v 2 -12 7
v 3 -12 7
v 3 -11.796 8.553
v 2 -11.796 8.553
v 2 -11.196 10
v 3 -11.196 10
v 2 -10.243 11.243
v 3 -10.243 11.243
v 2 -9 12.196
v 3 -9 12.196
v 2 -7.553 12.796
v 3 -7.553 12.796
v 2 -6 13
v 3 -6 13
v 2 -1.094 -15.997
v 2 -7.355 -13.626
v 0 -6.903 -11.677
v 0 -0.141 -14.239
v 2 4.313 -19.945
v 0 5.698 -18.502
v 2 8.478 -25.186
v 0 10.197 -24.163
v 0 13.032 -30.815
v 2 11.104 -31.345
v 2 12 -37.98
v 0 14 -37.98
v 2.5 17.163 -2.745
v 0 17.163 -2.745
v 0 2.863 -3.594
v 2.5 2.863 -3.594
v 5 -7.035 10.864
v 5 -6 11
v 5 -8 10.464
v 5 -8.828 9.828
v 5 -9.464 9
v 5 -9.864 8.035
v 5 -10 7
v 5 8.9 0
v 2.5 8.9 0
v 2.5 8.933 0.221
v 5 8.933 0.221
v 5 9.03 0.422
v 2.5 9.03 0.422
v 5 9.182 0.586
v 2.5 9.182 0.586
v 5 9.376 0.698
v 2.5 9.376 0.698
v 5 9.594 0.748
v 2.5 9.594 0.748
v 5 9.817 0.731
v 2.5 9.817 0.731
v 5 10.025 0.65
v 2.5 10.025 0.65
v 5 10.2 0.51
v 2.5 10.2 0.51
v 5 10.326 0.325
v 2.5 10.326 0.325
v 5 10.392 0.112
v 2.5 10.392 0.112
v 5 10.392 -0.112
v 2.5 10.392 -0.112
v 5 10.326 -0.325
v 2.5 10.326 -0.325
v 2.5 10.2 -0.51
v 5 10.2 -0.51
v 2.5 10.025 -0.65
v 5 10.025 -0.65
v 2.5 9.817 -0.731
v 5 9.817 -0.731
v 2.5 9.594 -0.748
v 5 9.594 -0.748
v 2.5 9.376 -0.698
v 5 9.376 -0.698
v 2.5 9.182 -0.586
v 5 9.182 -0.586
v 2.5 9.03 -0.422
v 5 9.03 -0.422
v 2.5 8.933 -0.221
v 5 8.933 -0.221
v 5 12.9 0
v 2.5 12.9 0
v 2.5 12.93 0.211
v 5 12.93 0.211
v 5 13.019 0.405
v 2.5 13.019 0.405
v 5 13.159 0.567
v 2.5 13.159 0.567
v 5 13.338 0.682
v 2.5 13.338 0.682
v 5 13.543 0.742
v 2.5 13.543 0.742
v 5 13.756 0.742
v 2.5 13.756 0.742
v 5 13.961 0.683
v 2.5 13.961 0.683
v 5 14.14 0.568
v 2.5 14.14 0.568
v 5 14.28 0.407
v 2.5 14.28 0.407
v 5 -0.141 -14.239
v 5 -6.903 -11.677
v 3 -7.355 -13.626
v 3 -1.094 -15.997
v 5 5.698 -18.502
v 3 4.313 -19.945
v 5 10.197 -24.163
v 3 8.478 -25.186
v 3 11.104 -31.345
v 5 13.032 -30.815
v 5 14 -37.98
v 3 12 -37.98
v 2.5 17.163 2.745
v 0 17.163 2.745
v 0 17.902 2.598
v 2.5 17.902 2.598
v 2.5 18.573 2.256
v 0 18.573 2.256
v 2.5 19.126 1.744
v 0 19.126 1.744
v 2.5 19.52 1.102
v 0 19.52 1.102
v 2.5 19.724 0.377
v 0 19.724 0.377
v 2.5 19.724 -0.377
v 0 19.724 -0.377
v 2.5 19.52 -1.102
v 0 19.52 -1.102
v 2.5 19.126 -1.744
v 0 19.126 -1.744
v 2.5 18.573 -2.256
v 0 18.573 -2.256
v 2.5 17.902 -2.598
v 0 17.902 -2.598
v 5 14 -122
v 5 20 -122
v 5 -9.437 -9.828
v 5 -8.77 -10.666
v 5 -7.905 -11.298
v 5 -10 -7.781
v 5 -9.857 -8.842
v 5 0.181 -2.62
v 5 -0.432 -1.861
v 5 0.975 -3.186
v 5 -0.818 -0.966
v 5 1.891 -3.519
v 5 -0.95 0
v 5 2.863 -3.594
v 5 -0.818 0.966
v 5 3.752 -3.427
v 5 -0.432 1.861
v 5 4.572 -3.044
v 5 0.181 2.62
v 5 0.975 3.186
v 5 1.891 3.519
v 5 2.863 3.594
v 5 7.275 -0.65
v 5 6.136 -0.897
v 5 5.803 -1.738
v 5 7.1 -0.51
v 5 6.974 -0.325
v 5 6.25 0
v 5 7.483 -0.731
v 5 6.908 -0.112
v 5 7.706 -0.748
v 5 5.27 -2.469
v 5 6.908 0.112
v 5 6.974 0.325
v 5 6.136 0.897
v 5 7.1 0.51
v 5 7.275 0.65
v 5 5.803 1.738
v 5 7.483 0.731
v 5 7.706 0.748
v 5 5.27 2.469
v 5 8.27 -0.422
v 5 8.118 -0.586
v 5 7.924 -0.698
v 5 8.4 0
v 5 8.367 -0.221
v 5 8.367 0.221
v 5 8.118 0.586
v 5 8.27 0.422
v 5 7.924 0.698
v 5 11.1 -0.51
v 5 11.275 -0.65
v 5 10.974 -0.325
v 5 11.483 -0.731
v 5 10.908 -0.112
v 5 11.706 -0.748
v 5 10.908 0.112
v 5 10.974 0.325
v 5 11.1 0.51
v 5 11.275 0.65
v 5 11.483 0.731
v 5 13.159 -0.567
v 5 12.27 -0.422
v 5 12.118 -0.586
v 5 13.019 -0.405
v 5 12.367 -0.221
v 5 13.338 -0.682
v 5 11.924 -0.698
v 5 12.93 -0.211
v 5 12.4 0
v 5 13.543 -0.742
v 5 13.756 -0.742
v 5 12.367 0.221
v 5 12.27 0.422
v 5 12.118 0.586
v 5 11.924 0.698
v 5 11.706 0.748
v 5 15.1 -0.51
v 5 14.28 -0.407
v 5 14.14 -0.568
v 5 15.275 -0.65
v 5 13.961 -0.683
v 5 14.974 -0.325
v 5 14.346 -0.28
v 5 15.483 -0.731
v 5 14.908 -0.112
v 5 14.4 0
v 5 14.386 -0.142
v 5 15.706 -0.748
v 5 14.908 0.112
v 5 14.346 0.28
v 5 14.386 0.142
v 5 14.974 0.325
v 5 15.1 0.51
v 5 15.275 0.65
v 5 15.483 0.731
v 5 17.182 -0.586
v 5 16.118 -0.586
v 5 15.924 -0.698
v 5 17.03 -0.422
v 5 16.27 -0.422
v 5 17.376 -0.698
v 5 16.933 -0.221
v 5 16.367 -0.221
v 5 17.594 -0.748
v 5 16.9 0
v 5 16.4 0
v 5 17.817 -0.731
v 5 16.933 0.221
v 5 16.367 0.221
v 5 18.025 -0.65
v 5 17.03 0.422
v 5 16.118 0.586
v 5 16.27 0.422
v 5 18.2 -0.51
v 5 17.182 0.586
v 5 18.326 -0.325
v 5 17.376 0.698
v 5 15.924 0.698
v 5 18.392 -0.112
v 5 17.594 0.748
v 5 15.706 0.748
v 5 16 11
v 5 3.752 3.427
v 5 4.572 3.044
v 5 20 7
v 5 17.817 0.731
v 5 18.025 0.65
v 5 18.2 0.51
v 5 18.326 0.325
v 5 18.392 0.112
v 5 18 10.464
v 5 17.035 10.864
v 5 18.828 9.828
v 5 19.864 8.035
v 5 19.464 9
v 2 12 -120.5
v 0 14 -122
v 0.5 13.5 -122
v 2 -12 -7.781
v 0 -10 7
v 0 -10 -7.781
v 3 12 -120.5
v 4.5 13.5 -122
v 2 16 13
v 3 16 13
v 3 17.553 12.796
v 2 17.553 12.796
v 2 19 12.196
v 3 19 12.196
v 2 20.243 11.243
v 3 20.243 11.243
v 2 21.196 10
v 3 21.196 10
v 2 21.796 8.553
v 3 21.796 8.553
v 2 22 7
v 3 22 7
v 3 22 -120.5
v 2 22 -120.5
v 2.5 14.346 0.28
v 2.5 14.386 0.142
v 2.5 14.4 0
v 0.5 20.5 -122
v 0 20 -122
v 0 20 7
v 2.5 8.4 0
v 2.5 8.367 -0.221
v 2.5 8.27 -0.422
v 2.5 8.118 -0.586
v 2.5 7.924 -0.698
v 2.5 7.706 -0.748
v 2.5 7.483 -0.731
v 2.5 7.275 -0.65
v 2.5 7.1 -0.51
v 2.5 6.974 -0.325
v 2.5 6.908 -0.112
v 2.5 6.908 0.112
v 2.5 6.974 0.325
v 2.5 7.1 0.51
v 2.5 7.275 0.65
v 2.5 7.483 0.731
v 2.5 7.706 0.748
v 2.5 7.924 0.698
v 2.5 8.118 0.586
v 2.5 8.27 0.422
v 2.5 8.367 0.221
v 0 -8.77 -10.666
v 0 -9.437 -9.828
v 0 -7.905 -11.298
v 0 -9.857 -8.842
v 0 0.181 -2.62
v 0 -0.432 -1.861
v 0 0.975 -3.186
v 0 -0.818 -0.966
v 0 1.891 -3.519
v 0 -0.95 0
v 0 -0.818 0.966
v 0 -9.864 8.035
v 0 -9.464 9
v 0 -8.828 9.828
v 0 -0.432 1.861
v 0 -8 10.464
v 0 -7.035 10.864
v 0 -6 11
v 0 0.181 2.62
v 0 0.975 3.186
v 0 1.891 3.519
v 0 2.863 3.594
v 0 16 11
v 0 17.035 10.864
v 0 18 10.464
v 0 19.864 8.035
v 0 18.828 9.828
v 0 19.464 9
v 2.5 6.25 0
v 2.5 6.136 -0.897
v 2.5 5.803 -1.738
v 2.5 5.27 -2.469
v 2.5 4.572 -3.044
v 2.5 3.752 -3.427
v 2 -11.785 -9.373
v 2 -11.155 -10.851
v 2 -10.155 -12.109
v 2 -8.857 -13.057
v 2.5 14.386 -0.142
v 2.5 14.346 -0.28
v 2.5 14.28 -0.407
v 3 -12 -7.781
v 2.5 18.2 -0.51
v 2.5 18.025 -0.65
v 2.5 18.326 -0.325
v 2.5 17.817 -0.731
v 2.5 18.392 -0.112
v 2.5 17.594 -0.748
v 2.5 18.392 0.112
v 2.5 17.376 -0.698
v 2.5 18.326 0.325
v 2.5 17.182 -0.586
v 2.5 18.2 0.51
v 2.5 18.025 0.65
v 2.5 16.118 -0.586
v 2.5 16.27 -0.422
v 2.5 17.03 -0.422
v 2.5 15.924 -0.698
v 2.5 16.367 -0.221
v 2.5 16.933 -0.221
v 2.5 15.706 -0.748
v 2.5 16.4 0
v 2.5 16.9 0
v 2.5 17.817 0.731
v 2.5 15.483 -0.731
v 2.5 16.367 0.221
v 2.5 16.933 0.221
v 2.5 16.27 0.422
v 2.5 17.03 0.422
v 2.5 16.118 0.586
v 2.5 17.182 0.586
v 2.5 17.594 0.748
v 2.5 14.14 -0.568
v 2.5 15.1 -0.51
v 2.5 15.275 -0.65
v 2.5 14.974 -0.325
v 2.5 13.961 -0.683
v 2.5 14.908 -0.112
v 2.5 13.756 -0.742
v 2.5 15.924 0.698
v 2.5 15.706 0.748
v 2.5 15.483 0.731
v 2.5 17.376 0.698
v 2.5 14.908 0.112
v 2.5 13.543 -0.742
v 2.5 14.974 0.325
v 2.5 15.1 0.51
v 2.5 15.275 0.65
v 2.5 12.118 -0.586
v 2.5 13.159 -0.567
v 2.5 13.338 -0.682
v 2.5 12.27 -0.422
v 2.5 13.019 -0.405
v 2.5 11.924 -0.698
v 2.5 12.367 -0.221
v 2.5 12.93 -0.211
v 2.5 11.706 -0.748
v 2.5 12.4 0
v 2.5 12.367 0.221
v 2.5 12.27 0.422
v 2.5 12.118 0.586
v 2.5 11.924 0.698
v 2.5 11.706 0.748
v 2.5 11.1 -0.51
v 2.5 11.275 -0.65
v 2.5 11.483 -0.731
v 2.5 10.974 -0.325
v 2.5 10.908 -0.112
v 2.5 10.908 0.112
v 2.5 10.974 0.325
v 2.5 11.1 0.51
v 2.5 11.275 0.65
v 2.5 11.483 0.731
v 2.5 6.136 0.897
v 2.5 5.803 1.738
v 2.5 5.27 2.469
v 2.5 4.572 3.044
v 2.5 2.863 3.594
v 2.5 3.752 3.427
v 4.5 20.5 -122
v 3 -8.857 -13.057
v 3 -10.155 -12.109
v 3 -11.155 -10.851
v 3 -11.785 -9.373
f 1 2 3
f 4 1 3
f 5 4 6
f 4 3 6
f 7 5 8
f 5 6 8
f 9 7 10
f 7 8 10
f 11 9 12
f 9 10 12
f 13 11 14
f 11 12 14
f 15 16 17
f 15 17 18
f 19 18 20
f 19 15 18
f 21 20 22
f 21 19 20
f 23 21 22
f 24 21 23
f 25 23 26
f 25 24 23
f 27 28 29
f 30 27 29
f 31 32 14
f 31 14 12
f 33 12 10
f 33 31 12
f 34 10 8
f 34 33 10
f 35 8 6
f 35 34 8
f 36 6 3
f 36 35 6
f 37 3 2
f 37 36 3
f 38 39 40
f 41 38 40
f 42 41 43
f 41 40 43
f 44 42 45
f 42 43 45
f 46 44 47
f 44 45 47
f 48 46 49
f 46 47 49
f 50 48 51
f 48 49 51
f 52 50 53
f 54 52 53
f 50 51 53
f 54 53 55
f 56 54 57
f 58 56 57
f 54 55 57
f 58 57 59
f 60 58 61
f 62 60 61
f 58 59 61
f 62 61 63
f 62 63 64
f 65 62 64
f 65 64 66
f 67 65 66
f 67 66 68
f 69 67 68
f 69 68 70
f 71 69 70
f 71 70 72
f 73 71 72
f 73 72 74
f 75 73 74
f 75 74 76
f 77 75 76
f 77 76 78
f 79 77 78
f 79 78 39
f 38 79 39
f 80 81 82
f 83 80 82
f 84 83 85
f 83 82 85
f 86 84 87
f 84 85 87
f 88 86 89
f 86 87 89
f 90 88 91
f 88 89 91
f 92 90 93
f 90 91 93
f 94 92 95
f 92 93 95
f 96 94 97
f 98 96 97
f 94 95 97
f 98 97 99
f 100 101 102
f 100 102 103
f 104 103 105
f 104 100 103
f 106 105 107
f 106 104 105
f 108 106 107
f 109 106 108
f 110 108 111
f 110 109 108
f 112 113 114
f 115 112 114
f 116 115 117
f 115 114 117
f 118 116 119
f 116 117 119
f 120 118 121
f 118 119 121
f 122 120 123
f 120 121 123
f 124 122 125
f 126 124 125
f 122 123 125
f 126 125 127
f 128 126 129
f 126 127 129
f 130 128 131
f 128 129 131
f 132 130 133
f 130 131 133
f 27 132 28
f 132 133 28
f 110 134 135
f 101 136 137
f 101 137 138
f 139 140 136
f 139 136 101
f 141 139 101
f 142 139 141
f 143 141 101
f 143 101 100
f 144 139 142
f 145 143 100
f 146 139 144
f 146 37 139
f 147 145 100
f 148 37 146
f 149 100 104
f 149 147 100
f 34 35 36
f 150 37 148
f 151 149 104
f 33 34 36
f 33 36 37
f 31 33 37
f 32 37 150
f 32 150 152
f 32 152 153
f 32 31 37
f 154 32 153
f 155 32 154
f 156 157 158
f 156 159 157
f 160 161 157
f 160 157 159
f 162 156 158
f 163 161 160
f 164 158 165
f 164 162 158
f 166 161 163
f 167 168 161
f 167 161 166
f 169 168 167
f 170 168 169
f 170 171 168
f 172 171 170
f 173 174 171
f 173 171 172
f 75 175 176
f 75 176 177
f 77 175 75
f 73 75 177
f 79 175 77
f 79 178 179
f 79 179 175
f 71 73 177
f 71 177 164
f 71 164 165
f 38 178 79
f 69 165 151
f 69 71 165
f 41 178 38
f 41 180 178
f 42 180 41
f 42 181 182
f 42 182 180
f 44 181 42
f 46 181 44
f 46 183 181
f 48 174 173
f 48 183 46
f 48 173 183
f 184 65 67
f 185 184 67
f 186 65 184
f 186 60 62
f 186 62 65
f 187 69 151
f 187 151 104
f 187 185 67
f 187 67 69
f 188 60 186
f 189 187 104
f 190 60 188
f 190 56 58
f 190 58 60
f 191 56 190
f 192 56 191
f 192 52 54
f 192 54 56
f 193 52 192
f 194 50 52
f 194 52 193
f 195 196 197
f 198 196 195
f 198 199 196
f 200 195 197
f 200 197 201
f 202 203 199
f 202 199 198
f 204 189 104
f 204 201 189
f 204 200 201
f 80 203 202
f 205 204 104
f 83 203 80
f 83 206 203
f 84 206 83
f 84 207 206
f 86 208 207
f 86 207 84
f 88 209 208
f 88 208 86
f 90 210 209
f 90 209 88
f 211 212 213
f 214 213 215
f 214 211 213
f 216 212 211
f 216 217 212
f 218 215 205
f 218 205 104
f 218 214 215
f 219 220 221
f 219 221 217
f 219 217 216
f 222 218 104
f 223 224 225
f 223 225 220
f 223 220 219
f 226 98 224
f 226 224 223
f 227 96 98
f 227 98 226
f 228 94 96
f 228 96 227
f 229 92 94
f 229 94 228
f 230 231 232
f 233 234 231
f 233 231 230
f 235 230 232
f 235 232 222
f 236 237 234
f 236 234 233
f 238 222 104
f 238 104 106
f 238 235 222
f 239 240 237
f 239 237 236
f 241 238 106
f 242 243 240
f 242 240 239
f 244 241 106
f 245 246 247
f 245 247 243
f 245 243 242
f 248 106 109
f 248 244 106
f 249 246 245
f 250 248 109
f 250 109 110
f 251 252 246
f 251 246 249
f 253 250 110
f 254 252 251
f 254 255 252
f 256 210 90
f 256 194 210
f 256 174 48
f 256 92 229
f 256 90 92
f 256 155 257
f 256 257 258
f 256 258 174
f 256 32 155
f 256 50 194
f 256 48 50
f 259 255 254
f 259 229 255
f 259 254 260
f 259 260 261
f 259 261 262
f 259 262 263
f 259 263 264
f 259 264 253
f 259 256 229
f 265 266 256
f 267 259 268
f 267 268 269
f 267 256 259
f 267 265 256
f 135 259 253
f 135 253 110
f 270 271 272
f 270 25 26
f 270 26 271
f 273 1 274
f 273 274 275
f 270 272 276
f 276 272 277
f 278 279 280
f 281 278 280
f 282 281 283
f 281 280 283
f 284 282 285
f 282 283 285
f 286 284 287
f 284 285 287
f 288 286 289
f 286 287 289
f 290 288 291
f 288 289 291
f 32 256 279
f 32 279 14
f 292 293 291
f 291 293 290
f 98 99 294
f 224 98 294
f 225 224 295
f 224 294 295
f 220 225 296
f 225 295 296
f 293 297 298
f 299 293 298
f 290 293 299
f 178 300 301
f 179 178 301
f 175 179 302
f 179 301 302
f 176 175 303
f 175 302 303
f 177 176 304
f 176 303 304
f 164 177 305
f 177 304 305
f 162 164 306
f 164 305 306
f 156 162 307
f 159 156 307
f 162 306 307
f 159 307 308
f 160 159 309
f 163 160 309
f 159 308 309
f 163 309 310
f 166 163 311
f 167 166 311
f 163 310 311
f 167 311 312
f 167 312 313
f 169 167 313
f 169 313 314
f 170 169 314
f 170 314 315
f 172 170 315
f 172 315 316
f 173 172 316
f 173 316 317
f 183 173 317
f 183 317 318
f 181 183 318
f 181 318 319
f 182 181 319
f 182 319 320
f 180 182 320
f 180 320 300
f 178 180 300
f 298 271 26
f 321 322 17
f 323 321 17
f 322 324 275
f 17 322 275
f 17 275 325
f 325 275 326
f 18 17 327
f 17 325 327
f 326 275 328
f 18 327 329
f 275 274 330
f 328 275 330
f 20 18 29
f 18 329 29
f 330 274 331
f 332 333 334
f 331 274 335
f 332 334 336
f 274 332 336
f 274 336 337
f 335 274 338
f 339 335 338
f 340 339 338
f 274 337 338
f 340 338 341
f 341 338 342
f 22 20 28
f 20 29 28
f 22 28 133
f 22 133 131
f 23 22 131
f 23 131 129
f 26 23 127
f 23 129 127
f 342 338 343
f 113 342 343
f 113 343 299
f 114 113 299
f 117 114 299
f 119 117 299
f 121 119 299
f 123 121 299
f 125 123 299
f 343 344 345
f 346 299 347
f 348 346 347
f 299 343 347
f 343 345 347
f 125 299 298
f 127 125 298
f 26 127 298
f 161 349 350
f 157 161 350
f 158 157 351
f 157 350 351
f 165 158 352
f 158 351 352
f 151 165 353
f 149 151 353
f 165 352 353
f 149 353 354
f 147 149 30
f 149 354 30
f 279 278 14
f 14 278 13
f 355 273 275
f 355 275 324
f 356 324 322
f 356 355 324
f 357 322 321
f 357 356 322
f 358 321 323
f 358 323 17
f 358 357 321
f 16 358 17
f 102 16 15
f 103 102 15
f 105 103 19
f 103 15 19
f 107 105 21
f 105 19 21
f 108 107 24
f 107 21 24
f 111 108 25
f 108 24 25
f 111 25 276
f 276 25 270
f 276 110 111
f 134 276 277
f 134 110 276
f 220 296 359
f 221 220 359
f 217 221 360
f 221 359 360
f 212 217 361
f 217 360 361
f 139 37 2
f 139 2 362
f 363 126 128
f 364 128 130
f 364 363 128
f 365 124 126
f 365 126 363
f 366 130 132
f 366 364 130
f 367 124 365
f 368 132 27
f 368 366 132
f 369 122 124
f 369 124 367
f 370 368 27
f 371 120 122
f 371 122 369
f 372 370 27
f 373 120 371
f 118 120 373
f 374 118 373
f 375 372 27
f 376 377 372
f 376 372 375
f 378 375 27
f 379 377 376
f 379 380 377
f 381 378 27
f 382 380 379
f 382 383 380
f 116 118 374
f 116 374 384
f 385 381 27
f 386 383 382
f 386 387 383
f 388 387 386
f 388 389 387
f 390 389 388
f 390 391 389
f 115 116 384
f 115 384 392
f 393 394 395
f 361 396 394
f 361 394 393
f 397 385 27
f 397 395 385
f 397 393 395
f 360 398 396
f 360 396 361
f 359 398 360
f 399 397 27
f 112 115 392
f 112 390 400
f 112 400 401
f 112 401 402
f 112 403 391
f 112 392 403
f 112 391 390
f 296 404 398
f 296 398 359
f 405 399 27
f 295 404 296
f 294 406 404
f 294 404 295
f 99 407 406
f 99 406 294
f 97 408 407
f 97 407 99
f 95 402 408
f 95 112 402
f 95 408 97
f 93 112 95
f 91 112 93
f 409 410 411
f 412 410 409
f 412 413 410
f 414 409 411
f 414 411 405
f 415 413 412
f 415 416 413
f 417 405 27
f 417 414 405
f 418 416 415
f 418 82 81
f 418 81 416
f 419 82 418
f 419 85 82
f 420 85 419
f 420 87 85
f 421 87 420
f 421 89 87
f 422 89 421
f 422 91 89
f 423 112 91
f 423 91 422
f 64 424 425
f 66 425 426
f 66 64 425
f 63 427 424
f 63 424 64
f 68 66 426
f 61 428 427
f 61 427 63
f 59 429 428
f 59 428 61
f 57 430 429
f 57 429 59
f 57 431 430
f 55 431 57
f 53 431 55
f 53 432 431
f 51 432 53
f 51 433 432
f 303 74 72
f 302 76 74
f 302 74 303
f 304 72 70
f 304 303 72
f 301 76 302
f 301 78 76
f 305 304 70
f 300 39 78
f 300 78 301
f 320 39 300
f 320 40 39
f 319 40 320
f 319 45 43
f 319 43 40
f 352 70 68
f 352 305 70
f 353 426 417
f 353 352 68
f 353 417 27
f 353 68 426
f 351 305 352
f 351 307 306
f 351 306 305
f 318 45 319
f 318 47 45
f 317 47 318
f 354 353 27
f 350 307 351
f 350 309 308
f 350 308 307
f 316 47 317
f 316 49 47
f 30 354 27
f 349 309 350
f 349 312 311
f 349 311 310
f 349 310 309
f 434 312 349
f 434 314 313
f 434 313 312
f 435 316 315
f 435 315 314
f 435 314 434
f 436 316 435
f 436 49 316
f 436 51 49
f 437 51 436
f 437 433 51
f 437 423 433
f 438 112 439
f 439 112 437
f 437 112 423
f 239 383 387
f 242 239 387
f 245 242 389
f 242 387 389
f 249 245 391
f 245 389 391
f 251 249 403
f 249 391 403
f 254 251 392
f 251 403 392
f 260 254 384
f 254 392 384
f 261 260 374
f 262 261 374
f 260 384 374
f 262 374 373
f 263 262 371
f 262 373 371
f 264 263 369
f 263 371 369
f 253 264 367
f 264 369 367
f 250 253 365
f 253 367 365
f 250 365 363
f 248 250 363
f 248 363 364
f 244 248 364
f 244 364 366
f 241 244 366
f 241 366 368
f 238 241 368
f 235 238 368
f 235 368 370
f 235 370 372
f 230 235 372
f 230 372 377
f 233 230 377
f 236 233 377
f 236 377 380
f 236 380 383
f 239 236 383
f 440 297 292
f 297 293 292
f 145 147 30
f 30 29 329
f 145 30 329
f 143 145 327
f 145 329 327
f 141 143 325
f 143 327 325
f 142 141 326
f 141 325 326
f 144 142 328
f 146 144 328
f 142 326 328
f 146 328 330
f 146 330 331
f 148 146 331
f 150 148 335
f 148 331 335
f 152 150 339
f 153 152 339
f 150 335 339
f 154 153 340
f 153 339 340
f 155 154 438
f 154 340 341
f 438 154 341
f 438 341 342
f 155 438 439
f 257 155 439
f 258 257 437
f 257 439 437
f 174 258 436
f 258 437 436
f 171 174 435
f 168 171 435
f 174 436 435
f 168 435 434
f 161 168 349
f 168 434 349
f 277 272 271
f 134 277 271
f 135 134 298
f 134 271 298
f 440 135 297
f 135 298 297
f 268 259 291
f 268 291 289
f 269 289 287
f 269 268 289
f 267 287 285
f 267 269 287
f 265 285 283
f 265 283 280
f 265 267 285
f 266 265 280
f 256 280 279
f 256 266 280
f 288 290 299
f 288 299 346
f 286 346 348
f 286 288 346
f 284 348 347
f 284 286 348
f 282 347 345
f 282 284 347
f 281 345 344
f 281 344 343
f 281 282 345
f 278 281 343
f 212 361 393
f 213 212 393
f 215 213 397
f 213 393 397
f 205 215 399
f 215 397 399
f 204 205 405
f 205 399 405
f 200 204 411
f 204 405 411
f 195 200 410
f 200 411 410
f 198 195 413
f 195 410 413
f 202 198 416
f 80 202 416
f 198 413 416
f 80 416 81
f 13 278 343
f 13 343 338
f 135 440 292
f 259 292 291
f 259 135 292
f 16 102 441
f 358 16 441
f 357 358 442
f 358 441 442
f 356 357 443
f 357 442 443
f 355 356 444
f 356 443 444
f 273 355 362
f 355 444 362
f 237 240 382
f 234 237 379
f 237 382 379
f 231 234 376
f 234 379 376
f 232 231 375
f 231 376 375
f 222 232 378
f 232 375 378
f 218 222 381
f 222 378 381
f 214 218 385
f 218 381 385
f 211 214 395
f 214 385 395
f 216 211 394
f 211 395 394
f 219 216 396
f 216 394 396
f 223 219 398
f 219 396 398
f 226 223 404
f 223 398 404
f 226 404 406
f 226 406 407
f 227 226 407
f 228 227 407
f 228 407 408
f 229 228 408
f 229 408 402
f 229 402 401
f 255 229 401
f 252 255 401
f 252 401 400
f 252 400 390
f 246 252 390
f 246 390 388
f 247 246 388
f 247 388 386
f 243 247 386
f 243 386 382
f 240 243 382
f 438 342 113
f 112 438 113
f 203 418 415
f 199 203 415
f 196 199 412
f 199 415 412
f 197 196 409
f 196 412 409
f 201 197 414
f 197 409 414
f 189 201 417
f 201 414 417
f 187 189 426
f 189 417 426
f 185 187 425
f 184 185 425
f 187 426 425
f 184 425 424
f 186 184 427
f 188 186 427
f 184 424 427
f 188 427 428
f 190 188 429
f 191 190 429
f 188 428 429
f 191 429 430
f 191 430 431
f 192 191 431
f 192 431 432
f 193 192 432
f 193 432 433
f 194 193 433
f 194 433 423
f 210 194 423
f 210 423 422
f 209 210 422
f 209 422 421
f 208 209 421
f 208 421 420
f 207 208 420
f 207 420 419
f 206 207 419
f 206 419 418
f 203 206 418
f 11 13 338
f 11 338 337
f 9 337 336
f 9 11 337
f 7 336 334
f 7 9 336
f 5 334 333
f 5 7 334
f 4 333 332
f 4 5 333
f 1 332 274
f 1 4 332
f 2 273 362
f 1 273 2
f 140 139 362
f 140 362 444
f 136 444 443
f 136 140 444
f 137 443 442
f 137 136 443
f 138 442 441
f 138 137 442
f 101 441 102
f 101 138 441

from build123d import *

# Parameters (mm, degrees)
F0_W        = 24
F0_H        = 26
F1_DEPTH    = 5
F2_T1_DEPTH = 5
F3_SIZE     = 1.5
F4_R        = 6
F5_SIZE     = 2
F6_R        = 0.75
F7_DEPTH    = 5
F8_DEPTH    = 2.5


# Not quite as in the source:
# - a fillet or chamfer that OpenCascade refuses, or shapes differently, is made with other operations: its cross-section is extruded or revolved along the edge and cut away or added


with BuildPart() as f1:
    # F0 (on Right) → F1 (new body)
    with BuildSketch(Plane.YZ):
        Rectangle(F0_W, F0_H)
        Polygon((22, 13), (12, 13), (12, -13), (12, -122), (22, -122), align=None)
    extrude(amount=F1_DEPTH)

    # F2: fillet of radius 25 on 1 edges, made by hand

    # F2_s2 → F2_t1 (join)
    with BuildSketch(Plane.YZ):
        with BuildLine():
            ThreePointArc((-12, -13), (5.0277563773, -20.6594839179), (12, -37.9799919936))
            Line((12, -37.9799919936), (12, -13))
            Line((12, -13), (-12, -13))
        make_face()
    extrude(amount=F2_T1_DEPTH)

    # F3
    f3_edges = [f1.edges().sort_by_distance(p)[0] for p in [
        (2.5, 12, -122),
        (2.5, 22, -122),
    ]]
    chamfer(f3_edges, length=F3_SIZE)

    # F4
    f4_edges = [f1.edges().sort_by_distance(p)[0] for p in [
        (2.5, -12, -13),
        (2.5, -12, 13),
        (2.5, 22, 13),
    ]]
    fillet(f4_edges, radius=F4_R)

    # F5
    f5_edges = [f1.edges().sort_by_distance(p)[0] for p in [
        (5, 22, -56.75),
        (0, 22, -56.75),
        (0, 6.572034, -22.425717),
        (0, -10.697288, -11.51368),
        (0, 12, -79.239996),
        (0, -12, -0.390327),
        (0, -10.242641, 11.242641),
        (0, 5, 13),
        (0, 20.242641, 11.242641),
        (5, 6.572034, -22.425717),
        (5, -10.697288, -11.51368),
        (5, 12, -79.239996),
        (5, -12, -0.390327),
        (5, -10.242641, 11.242641),
        (5, 5, 13),
        (5, 20.242641, 11.242641),
    ]]
    chamfer(f5_edges, length=F5_SIZE)

    # F6 (on face) → F7 (cut)
    with BuildSketch(Plane(origin=(0, 0, 0), x_dir=(0, -1, 0), z_dir=(-1, 0, 0))):
        with BuildLine():
            ThreePointArc((-2.8632404181, 3.5936789679), (-5.2698917444, 2.469041767), (-6.25, 0))
            ThreePointArc((-6.25, 0), (-5.2698917444, -2.469041767), (-2.8632404181, -3.5936789679))
            ThreePointArc((-2.8632404181, -3.5936789679), (-0.180958233, -2.6198917444), (0.95, 0))
            ThreePointArc((0.95, 0), (-0.180958233, 2.6198917444), (-2.8632404181, 3.5936789679))
        make_face()
        with BuildLine():
            ThreePointArc((-5.25, 0), (-2.65, 2.6), (-0.05, 0))
            ThreePointArc((-0.05, 0), (-2.65, -2.6), (-5.25, 0))
        make_face(mode=Mode.SUBTRACT)
        with BuildLine():
            ThreePointArc((-5.25, 0), (-2.65, -2.6), (-0.05, 0))
            ThreePointArc((-0.05, 0), (-2.65, 2.6), (-5.25, 0))
        make_face()
        with Locations((-17.65, 0)):
            Circle(F6_R)
        with BuildLine():
            Line((-16.4, 0), (-14.9, 0))
            ThreePointArc((-14.9, 0), (-15.65, 0.75), (-16.4, 0))
        make_face()
        with BuildLine():
            ThreePointArc((-16.4, 0), (-15.65, -0.75), (-14.9, 0))
            Line((-14.9, 0), (-16.4, 0))
        make_face()
        with BuildLine():
            ThreePointArc((-10.9, 0), (-11.65, 0.75), (-12.4, 0))
            Line((-12.4, 0), (-10.9, 0))
        make_face()
        with BuildLine():
            Line((-10.9, 0), (-12.4, 0))
            ThreePointArc((-12.4, 0), (-11.65, -0.75), (-10.9, 0))
        make_face()
        with BuildLine():
            ThreePointArc((-10.4, 0), (-9.65, -0.75), (-8.9, 0))
            Line((-8.9, 0), (-10.4, 0))
        make_face()
        with BuildLine():
            Line((-10.4, 0), (-8.9, 0))
            ThreePointArc((-8.9, 0), (-9.65, 0.75), (-10.4, 0))
        make_face()
        with BuildLine():
            Line((-8.4, 0), (-6.9, 0))
            ThreePointArc((-6.9, 0), (-7.65, 0.75), (-8.4, 0))
        make_face()
        with BuildLine():
            ThreePointArc((-8.4, 0), (-7.65, -0.75), (-6.9, 0))
            Line((-6.9, 0), (-8.4, 0))
        make_face()
        with BuildLine():
            ThreePointArc((-12.9, 0), (-13.4380659424, 0.719433079), (-14.2802238806, 0.406592991))
            ThreePointArc((-14.2802238806, 0.406592991), (-14.2575663793, 0.2038573909), (-14.25, 0))
            Line((-14.25, 0), (-12.9, 0))
        make_face()
        with BuildLine():
            ThreePointArc((-14.25, 0), (-14.2575663793, -0.2038573909), (-14.2802238806, -0.406592991))
            ThreePointArc((-14.2802238806, -0.406592991), (-13.4380659424, -0.719433079), (-12.9, 0))
            Line((-12.9, 0), (-14.25, 0))
        make_face()
        with BuildLine():
            ThreePointArc((-14.4, 0), (-14.369433079, -0.2119340576), (-14.2802238806, -0.406592991))
            ThreePointArc((-14.2802238806, -0.406592991), (-14.2575663793, -0.2038573909), (-14.25, 0))
            Line((-14.25, 0), (-14.4, 0))
        make_face()
        with BuildLine():
            ThreePointArc((-14.25, 0), (-14.2575663793, 0.2038573909), (-14.2802238806, 0.406592991))
            ThreePointArc((-14.2802238806, 0.406592991), (-14.369433079, 0.2119340576), (-14.4, 0))
            Line((-14.4, 0), (-14.25, 0))
        make_face()
    extrude(amount=-F7_DEPTH, mode=Mode.SUBTRACT)

    # F6 (on face) → F8 (cut)
    with BuildSketch(Plane(origin=(0, 0, 0), x_dir=(0, -1, 0), z_dir=(-1, 0, 0))):
        with BuildLine():
            ThreePointArc((-2.8632404181, -3.5936789679), (-5.2698917444, -2.469041767), (-6.25, 0))
            Line((-6.25, 0), (-6.9, 0))
            ThreePointArc((-6.9, 0), (-7.65, -0.75), (-8.4, 0))
            Line((-8.4, 0), (-8.9, 0))
            ThreePointArc((-8.9, 0), (-9.65, -0.75), (-10.4, 0))
            Line((-10.4, 0), (-10.9, 0))
            ThreePointArc((-10.9, 0), (-11.65, -0.75), (-12.4, 0))
            Line((-12.4, 0), (-12.9, 0))
            ThreePointArc((-12.9, 0), (-13.4380659424, -0.719433079), (-14.2802238806, -0.406592991))
            ThreePointArc((-14.2802238806, -0.406592991), (-15.2674725396, -2.1356143376), (-17.1628919861, -2.7451714338))
            Line((-17.1628919861, -2.7451714338), (-2.8632404181, -3.5936789679))
        make_face()
        with BuildLine():
            ThreePointArc((-14.2802238806, 0.406592991), (-15.2674725396, 2.1356143376), (-17.1628919861, 2.7451714338))
            ThreePointArc((-17.1628919861, 2.7451714338), (-19.75, 0), (-17.1628919861, -2.7451714338))
            ThreePointArc((-17.1628919861, -2.7451714338), (-15.2674725396, -2.1356143376), (-14.2802238806, -0.406592991))
            ThreePointArc((-14.2802238806, -0.406592991), (-14.369433079, -0.2119340576), (-14.4, 0))
            ThreePointArc((-14.4, 0), (-14.369433079, 0.2119340576), (-14.2802238806, 0.406592991))
        make_face()
        with Locations((-17.65, 0)):
            Circle(F6_R, mode=Mode.SUBTRACT)
        with BuildLine():
            ThreePointArc((-16.4, 0), (-15.65, 0.75), (-14.9, 0))
            ThreePointArc((-14.9, 0), (-15.65, -0.75), (-16.4, 0))
        make_face(mode=Mode.SUBTRACT)
        with BuildLine():
            Line((-6.9, 0), (-6.25, 0))
            ThreePointArc((-6.25, 0), (-5.2698917444, 2.469041767), (-2.8632404181, 3.5936789679))
            Line((-2.8632404181, 3.5936789679), (-17.1628919861, 2.7451714338))
            ThreePointArc((-17.1628919861, 2.7451714338), (-15.2674725396, 2.1356143376), (-14.2802238806, 0.406592991))
            ThreePointArc((-14.2802238806, 0.406592991), (-13.4380659424, 0.719433079), (-12.9, 0))
            Line((-12.9, 0), (-12.4, 0))
            ThreePointArc((-12.4, 0), (-11.65, 0.75), (-10.9, 0))
            Line((-10.9, 0), (-10.4, 0))
            ThreePointArc((-10.4, 0), (-9.65, 0.75), (-8.9, 0))
            Line((-8.9, 0), (-8.4, 0))
            ThreePointArc((-8.4, 0), (-7.65, 0.75), (-6.9, 0))
        make_face()
    extrude(amount=-F8_DEPTH, mode=Mode.SUBTRACT)


solid = f1.part
